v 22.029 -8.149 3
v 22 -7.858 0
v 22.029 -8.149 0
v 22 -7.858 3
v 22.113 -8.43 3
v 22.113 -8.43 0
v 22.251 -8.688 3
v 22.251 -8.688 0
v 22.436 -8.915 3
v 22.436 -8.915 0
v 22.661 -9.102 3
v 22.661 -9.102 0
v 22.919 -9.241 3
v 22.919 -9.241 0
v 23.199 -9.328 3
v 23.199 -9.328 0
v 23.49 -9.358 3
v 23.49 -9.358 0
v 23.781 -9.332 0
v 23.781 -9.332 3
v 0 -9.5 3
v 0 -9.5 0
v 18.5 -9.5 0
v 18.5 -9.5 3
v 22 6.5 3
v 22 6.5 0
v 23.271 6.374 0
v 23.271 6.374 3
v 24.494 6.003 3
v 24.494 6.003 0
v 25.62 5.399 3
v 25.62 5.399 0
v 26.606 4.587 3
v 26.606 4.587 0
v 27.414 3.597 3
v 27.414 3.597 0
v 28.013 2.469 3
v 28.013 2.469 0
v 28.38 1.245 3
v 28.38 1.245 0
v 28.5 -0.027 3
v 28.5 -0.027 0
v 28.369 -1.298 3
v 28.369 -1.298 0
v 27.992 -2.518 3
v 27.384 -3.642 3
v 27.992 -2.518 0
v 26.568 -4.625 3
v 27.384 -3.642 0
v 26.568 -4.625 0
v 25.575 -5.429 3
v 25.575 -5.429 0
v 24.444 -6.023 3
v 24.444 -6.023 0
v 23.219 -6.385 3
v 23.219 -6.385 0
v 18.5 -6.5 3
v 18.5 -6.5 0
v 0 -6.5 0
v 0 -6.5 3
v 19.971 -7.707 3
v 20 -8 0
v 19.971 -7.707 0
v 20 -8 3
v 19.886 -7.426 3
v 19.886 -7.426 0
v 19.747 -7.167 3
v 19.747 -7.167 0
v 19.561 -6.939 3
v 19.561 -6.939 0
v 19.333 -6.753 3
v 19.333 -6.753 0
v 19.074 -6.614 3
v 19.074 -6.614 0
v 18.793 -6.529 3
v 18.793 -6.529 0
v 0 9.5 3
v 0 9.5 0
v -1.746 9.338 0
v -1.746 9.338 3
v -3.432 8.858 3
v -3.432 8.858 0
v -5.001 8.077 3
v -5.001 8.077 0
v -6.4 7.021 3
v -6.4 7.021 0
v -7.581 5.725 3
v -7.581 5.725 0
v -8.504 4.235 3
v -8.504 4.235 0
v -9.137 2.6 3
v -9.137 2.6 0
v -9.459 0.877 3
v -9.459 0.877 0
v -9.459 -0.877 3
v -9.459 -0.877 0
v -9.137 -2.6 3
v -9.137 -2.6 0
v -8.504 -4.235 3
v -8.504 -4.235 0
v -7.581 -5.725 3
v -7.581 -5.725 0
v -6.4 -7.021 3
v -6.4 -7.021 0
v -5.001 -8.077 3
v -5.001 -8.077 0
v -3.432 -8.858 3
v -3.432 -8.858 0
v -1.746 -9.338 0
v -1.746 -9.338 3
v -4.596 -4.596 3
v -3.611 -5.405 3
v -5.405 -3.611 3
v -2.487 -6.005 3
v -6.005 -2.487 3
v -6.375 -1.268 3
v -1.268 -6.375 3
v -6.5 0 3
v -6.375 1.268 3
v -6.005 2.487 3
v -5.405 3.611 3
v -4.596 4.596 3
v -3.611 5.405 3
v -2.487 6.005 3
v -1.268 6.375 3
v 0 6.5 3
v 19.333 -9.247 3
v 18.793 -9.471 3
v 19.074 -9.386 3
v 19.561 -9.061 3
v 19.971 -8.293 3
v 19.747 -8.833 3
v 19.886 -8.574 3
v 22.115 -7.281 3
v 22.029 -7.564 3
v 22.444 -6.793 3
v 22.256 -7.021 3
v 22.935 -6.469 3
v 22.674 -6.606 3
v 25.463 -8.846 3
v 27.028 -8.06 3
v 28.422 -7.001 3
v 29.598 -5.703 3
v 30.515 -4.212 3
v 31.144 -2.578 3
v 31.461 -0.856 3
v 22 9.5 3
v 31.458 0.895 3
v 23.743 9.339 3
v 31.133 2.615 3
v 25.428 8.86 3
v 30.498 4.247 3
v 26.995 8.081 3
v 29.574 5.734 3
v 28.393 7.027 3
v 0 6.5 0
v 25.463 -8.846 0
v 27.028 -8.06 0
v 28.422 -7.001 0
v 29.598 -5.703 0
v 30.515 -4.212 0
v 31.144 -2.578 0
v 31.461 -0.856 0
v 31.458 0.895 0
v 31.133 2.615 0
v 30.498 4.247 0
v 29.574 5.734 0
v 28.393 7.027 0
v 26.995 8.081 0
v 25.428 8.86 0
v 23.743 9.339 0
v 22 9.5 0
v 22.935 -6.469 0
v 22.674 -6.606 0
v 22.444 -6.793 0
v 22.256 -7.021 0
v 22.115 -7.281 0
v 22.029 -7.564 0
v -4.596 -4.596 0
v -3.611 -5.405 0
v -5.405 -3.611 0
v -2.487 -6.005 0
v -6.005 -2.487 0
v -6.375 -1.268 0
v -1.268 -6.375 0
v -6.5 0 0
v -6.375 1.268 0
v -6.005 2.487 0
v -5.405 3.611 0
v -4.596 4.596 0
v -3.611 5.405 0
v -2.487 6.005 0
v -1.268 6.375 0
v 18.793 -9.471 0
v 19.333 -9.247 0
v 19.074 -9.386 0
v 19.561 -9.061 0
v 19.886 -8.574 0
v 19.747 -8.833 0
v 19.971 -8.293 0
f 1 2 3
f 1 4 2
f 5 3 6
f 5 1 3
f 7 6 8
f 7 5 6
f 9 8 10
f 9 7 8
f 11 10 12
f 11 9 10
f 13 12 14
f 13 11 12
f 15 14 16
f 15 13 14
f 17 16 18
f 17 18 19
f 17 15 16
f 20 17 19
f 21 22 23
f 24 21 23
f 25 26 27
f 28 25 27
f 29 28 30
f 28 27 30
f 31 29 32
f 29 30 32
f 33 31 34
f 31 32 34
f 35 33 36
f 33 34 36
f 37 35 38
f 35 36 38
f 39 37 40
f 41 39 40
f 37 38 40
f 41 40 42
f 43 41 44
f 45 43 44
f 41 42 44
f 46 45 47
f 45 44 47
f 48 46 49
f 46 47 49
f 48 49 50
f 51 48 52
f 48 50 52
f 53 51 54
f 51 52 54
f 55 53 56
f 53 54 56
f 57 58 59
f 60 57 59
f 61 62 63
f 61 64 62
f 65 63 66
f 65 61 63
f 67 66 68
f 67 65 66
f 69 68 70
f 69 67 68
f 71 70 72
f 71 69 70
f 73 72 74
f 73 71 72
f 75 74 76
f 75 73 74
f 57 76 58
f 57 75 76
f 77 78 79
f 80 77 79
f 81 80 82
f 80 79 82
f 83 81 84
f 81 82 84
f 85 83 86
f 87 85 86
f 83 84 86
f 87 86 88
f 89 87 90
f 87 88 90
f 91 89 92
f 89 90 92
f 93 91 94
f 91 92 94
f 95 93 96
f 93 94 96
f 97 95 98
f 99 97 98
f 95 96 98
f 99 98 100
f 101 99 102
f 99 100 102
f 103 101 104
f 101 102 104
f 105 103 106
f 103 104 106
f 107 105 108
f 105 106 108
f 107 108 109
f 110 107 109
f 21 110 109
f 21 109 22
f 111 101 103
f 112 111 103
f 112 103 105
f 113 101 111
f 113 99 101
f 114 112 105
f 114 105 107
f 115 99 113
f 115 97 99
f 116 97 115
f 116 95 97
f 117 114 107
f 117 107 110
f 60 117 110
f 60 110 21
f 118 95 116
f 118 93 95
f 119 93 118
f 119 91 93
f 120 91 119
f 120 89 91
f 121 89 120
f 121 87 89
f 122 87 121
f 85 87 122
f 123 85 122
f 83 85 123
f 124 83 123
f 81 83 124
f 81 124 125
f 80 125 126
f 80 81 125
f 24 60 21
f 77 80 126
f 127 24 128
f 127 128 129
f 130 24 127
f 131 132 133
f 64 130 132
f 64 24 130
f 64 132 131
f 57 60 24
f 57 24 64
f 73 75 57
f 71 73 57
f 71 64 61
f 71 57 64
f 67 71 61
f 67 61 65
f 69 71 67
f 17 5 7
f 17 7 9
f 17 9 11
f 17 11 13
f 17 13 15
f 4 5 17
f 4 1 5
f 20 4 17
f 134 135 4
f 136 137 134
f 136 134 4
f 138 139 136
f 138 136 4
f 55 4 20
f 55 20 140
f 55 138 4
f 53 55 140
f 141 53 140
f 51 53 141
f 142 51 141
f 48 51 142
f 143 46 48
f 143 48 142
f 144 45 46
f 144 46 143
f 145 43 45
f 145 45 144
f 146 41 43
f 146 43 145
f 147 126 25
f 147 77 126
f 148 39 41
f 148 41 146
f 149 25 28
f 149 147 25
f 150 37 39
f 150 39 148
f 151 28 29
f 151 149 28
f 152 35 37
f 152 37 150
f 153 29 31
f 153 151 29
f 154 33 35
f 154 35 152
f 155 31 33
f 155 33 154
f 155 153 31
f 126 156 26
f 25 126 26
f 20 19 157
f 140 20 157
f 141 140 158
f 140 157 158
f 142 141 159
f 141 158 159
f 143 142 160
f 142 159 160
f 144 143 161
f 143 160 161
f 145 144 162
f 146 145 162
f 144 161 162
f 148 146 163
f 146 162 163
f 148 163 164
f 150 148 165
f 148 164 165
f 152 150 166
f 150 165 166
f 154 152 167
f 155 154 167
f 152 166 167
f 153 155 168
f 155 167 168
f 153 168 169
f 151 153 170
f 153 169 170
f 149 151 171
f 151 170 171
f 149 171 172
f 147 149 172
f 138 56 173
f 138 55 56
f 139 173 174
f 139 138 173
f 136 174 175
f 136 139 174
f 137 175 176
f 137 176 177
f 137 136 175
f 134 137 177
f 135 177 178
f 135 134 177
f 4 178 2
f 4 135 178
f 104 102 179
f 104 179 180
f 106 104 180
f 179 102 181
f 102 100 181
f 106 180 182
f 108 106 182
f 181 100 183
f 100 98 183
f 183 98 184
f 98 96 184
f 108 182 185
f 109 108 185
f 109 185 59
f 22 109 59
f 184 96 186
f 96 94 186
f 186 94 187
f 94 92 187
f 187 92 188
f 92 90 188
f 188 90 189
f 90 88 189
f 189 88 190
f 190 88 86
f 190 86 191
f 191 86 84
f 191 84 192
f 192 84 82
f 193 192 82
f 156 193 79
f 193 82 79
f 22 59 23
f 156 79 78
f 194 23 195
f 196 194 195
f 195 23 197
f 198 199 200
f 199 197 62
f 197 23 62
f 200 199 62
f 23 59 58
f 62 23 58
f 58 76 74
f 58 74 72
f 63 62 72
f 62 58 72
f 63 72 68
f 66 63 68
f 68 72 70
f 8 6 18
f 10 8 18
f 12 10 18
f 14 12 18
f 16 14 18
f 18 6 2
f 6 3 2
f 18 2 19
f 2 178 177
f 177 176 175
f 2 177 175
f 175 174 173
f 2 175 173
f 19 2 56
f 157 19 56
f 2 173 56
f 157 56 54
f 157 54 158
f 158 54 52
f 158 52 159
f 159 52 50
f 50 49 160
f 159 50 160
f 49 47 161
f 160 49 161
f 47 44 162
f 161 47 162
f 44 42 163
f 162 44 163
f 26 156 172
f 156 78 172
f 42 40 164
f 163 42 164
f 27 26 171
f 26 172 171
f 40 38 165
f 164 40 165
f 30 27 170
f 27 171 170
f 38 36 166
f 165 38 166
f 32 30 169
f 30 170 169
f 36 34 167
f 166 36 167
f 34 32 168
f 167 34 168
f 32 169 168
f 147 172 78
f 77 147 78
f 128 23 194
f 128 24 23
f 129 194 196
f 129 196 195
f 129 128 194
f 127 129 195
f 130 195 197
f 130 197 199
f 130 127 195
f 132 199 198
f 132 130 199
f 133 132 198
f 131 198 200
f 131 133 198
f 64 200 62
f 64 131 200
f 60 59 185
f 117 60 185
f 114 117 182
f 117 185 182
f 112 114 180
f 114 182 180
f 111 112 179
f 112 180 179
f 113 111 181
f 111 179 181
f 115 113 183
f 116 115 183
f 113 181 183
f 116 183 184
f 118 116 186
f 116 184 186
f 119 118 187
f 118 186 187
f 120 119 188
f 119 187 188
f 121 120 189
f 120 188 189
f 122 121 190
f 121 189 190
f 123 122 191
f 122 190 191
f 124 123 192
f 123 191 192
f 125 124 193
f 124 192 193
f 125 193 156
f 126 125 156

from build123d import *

# Parameters (mm, degrees)
F1_DEPTH = 3
F2_R     = 1.49999


# Not quite as in the source:
# - a fillet or chamfer is up to 0.001 mm smaller than in the source, because OpenCascade refuses the exact size


with BuildPart() as f1:
    # F0 (on Top) → F1 (new body)
    with BuildSketch(Plane.XY):
        with BuildLine():
            ThreePointArc((0, -6.5), (-6.5, 0), (0, 6.5))
            Line((0, 6.5), (22, 6.5))
            ThreePointArc((22, 6.5), (28.5, 0), (22, -6.5))
            Line((22, -6.5), (22, -9.5))
            ThreePointArc((22, -9.5), (31.5, 0), (22, 9.5))
            Line((22, 9.5), (0, 9.5))
            ThreePointArc((0, 9.5), (-9.5, 0), (0, -9.5))
            Line((0, -9.5), (20, -9.5))
            Line((20, -9.5), (20, -6.5))
            Line((20, -6.5), (0, -6.5))
        make_face()
    extrude(amount=F1_DEPTH)

    # F2 (radius 1.5 in the source; OpenCascade refuses exactly that, so slightly less here)
    f2_edges = [f1.edges().sort_by_distance(p)[0] for p in [
        (20, -9.5, 1.5),
        (20, -6.5, 1.5),
        (22, -6.5, 1.5),
        (22, -9.5, 1.5),
    ]]
    fillet(f2_edges, radius=F2_R)


solid = f1.part
